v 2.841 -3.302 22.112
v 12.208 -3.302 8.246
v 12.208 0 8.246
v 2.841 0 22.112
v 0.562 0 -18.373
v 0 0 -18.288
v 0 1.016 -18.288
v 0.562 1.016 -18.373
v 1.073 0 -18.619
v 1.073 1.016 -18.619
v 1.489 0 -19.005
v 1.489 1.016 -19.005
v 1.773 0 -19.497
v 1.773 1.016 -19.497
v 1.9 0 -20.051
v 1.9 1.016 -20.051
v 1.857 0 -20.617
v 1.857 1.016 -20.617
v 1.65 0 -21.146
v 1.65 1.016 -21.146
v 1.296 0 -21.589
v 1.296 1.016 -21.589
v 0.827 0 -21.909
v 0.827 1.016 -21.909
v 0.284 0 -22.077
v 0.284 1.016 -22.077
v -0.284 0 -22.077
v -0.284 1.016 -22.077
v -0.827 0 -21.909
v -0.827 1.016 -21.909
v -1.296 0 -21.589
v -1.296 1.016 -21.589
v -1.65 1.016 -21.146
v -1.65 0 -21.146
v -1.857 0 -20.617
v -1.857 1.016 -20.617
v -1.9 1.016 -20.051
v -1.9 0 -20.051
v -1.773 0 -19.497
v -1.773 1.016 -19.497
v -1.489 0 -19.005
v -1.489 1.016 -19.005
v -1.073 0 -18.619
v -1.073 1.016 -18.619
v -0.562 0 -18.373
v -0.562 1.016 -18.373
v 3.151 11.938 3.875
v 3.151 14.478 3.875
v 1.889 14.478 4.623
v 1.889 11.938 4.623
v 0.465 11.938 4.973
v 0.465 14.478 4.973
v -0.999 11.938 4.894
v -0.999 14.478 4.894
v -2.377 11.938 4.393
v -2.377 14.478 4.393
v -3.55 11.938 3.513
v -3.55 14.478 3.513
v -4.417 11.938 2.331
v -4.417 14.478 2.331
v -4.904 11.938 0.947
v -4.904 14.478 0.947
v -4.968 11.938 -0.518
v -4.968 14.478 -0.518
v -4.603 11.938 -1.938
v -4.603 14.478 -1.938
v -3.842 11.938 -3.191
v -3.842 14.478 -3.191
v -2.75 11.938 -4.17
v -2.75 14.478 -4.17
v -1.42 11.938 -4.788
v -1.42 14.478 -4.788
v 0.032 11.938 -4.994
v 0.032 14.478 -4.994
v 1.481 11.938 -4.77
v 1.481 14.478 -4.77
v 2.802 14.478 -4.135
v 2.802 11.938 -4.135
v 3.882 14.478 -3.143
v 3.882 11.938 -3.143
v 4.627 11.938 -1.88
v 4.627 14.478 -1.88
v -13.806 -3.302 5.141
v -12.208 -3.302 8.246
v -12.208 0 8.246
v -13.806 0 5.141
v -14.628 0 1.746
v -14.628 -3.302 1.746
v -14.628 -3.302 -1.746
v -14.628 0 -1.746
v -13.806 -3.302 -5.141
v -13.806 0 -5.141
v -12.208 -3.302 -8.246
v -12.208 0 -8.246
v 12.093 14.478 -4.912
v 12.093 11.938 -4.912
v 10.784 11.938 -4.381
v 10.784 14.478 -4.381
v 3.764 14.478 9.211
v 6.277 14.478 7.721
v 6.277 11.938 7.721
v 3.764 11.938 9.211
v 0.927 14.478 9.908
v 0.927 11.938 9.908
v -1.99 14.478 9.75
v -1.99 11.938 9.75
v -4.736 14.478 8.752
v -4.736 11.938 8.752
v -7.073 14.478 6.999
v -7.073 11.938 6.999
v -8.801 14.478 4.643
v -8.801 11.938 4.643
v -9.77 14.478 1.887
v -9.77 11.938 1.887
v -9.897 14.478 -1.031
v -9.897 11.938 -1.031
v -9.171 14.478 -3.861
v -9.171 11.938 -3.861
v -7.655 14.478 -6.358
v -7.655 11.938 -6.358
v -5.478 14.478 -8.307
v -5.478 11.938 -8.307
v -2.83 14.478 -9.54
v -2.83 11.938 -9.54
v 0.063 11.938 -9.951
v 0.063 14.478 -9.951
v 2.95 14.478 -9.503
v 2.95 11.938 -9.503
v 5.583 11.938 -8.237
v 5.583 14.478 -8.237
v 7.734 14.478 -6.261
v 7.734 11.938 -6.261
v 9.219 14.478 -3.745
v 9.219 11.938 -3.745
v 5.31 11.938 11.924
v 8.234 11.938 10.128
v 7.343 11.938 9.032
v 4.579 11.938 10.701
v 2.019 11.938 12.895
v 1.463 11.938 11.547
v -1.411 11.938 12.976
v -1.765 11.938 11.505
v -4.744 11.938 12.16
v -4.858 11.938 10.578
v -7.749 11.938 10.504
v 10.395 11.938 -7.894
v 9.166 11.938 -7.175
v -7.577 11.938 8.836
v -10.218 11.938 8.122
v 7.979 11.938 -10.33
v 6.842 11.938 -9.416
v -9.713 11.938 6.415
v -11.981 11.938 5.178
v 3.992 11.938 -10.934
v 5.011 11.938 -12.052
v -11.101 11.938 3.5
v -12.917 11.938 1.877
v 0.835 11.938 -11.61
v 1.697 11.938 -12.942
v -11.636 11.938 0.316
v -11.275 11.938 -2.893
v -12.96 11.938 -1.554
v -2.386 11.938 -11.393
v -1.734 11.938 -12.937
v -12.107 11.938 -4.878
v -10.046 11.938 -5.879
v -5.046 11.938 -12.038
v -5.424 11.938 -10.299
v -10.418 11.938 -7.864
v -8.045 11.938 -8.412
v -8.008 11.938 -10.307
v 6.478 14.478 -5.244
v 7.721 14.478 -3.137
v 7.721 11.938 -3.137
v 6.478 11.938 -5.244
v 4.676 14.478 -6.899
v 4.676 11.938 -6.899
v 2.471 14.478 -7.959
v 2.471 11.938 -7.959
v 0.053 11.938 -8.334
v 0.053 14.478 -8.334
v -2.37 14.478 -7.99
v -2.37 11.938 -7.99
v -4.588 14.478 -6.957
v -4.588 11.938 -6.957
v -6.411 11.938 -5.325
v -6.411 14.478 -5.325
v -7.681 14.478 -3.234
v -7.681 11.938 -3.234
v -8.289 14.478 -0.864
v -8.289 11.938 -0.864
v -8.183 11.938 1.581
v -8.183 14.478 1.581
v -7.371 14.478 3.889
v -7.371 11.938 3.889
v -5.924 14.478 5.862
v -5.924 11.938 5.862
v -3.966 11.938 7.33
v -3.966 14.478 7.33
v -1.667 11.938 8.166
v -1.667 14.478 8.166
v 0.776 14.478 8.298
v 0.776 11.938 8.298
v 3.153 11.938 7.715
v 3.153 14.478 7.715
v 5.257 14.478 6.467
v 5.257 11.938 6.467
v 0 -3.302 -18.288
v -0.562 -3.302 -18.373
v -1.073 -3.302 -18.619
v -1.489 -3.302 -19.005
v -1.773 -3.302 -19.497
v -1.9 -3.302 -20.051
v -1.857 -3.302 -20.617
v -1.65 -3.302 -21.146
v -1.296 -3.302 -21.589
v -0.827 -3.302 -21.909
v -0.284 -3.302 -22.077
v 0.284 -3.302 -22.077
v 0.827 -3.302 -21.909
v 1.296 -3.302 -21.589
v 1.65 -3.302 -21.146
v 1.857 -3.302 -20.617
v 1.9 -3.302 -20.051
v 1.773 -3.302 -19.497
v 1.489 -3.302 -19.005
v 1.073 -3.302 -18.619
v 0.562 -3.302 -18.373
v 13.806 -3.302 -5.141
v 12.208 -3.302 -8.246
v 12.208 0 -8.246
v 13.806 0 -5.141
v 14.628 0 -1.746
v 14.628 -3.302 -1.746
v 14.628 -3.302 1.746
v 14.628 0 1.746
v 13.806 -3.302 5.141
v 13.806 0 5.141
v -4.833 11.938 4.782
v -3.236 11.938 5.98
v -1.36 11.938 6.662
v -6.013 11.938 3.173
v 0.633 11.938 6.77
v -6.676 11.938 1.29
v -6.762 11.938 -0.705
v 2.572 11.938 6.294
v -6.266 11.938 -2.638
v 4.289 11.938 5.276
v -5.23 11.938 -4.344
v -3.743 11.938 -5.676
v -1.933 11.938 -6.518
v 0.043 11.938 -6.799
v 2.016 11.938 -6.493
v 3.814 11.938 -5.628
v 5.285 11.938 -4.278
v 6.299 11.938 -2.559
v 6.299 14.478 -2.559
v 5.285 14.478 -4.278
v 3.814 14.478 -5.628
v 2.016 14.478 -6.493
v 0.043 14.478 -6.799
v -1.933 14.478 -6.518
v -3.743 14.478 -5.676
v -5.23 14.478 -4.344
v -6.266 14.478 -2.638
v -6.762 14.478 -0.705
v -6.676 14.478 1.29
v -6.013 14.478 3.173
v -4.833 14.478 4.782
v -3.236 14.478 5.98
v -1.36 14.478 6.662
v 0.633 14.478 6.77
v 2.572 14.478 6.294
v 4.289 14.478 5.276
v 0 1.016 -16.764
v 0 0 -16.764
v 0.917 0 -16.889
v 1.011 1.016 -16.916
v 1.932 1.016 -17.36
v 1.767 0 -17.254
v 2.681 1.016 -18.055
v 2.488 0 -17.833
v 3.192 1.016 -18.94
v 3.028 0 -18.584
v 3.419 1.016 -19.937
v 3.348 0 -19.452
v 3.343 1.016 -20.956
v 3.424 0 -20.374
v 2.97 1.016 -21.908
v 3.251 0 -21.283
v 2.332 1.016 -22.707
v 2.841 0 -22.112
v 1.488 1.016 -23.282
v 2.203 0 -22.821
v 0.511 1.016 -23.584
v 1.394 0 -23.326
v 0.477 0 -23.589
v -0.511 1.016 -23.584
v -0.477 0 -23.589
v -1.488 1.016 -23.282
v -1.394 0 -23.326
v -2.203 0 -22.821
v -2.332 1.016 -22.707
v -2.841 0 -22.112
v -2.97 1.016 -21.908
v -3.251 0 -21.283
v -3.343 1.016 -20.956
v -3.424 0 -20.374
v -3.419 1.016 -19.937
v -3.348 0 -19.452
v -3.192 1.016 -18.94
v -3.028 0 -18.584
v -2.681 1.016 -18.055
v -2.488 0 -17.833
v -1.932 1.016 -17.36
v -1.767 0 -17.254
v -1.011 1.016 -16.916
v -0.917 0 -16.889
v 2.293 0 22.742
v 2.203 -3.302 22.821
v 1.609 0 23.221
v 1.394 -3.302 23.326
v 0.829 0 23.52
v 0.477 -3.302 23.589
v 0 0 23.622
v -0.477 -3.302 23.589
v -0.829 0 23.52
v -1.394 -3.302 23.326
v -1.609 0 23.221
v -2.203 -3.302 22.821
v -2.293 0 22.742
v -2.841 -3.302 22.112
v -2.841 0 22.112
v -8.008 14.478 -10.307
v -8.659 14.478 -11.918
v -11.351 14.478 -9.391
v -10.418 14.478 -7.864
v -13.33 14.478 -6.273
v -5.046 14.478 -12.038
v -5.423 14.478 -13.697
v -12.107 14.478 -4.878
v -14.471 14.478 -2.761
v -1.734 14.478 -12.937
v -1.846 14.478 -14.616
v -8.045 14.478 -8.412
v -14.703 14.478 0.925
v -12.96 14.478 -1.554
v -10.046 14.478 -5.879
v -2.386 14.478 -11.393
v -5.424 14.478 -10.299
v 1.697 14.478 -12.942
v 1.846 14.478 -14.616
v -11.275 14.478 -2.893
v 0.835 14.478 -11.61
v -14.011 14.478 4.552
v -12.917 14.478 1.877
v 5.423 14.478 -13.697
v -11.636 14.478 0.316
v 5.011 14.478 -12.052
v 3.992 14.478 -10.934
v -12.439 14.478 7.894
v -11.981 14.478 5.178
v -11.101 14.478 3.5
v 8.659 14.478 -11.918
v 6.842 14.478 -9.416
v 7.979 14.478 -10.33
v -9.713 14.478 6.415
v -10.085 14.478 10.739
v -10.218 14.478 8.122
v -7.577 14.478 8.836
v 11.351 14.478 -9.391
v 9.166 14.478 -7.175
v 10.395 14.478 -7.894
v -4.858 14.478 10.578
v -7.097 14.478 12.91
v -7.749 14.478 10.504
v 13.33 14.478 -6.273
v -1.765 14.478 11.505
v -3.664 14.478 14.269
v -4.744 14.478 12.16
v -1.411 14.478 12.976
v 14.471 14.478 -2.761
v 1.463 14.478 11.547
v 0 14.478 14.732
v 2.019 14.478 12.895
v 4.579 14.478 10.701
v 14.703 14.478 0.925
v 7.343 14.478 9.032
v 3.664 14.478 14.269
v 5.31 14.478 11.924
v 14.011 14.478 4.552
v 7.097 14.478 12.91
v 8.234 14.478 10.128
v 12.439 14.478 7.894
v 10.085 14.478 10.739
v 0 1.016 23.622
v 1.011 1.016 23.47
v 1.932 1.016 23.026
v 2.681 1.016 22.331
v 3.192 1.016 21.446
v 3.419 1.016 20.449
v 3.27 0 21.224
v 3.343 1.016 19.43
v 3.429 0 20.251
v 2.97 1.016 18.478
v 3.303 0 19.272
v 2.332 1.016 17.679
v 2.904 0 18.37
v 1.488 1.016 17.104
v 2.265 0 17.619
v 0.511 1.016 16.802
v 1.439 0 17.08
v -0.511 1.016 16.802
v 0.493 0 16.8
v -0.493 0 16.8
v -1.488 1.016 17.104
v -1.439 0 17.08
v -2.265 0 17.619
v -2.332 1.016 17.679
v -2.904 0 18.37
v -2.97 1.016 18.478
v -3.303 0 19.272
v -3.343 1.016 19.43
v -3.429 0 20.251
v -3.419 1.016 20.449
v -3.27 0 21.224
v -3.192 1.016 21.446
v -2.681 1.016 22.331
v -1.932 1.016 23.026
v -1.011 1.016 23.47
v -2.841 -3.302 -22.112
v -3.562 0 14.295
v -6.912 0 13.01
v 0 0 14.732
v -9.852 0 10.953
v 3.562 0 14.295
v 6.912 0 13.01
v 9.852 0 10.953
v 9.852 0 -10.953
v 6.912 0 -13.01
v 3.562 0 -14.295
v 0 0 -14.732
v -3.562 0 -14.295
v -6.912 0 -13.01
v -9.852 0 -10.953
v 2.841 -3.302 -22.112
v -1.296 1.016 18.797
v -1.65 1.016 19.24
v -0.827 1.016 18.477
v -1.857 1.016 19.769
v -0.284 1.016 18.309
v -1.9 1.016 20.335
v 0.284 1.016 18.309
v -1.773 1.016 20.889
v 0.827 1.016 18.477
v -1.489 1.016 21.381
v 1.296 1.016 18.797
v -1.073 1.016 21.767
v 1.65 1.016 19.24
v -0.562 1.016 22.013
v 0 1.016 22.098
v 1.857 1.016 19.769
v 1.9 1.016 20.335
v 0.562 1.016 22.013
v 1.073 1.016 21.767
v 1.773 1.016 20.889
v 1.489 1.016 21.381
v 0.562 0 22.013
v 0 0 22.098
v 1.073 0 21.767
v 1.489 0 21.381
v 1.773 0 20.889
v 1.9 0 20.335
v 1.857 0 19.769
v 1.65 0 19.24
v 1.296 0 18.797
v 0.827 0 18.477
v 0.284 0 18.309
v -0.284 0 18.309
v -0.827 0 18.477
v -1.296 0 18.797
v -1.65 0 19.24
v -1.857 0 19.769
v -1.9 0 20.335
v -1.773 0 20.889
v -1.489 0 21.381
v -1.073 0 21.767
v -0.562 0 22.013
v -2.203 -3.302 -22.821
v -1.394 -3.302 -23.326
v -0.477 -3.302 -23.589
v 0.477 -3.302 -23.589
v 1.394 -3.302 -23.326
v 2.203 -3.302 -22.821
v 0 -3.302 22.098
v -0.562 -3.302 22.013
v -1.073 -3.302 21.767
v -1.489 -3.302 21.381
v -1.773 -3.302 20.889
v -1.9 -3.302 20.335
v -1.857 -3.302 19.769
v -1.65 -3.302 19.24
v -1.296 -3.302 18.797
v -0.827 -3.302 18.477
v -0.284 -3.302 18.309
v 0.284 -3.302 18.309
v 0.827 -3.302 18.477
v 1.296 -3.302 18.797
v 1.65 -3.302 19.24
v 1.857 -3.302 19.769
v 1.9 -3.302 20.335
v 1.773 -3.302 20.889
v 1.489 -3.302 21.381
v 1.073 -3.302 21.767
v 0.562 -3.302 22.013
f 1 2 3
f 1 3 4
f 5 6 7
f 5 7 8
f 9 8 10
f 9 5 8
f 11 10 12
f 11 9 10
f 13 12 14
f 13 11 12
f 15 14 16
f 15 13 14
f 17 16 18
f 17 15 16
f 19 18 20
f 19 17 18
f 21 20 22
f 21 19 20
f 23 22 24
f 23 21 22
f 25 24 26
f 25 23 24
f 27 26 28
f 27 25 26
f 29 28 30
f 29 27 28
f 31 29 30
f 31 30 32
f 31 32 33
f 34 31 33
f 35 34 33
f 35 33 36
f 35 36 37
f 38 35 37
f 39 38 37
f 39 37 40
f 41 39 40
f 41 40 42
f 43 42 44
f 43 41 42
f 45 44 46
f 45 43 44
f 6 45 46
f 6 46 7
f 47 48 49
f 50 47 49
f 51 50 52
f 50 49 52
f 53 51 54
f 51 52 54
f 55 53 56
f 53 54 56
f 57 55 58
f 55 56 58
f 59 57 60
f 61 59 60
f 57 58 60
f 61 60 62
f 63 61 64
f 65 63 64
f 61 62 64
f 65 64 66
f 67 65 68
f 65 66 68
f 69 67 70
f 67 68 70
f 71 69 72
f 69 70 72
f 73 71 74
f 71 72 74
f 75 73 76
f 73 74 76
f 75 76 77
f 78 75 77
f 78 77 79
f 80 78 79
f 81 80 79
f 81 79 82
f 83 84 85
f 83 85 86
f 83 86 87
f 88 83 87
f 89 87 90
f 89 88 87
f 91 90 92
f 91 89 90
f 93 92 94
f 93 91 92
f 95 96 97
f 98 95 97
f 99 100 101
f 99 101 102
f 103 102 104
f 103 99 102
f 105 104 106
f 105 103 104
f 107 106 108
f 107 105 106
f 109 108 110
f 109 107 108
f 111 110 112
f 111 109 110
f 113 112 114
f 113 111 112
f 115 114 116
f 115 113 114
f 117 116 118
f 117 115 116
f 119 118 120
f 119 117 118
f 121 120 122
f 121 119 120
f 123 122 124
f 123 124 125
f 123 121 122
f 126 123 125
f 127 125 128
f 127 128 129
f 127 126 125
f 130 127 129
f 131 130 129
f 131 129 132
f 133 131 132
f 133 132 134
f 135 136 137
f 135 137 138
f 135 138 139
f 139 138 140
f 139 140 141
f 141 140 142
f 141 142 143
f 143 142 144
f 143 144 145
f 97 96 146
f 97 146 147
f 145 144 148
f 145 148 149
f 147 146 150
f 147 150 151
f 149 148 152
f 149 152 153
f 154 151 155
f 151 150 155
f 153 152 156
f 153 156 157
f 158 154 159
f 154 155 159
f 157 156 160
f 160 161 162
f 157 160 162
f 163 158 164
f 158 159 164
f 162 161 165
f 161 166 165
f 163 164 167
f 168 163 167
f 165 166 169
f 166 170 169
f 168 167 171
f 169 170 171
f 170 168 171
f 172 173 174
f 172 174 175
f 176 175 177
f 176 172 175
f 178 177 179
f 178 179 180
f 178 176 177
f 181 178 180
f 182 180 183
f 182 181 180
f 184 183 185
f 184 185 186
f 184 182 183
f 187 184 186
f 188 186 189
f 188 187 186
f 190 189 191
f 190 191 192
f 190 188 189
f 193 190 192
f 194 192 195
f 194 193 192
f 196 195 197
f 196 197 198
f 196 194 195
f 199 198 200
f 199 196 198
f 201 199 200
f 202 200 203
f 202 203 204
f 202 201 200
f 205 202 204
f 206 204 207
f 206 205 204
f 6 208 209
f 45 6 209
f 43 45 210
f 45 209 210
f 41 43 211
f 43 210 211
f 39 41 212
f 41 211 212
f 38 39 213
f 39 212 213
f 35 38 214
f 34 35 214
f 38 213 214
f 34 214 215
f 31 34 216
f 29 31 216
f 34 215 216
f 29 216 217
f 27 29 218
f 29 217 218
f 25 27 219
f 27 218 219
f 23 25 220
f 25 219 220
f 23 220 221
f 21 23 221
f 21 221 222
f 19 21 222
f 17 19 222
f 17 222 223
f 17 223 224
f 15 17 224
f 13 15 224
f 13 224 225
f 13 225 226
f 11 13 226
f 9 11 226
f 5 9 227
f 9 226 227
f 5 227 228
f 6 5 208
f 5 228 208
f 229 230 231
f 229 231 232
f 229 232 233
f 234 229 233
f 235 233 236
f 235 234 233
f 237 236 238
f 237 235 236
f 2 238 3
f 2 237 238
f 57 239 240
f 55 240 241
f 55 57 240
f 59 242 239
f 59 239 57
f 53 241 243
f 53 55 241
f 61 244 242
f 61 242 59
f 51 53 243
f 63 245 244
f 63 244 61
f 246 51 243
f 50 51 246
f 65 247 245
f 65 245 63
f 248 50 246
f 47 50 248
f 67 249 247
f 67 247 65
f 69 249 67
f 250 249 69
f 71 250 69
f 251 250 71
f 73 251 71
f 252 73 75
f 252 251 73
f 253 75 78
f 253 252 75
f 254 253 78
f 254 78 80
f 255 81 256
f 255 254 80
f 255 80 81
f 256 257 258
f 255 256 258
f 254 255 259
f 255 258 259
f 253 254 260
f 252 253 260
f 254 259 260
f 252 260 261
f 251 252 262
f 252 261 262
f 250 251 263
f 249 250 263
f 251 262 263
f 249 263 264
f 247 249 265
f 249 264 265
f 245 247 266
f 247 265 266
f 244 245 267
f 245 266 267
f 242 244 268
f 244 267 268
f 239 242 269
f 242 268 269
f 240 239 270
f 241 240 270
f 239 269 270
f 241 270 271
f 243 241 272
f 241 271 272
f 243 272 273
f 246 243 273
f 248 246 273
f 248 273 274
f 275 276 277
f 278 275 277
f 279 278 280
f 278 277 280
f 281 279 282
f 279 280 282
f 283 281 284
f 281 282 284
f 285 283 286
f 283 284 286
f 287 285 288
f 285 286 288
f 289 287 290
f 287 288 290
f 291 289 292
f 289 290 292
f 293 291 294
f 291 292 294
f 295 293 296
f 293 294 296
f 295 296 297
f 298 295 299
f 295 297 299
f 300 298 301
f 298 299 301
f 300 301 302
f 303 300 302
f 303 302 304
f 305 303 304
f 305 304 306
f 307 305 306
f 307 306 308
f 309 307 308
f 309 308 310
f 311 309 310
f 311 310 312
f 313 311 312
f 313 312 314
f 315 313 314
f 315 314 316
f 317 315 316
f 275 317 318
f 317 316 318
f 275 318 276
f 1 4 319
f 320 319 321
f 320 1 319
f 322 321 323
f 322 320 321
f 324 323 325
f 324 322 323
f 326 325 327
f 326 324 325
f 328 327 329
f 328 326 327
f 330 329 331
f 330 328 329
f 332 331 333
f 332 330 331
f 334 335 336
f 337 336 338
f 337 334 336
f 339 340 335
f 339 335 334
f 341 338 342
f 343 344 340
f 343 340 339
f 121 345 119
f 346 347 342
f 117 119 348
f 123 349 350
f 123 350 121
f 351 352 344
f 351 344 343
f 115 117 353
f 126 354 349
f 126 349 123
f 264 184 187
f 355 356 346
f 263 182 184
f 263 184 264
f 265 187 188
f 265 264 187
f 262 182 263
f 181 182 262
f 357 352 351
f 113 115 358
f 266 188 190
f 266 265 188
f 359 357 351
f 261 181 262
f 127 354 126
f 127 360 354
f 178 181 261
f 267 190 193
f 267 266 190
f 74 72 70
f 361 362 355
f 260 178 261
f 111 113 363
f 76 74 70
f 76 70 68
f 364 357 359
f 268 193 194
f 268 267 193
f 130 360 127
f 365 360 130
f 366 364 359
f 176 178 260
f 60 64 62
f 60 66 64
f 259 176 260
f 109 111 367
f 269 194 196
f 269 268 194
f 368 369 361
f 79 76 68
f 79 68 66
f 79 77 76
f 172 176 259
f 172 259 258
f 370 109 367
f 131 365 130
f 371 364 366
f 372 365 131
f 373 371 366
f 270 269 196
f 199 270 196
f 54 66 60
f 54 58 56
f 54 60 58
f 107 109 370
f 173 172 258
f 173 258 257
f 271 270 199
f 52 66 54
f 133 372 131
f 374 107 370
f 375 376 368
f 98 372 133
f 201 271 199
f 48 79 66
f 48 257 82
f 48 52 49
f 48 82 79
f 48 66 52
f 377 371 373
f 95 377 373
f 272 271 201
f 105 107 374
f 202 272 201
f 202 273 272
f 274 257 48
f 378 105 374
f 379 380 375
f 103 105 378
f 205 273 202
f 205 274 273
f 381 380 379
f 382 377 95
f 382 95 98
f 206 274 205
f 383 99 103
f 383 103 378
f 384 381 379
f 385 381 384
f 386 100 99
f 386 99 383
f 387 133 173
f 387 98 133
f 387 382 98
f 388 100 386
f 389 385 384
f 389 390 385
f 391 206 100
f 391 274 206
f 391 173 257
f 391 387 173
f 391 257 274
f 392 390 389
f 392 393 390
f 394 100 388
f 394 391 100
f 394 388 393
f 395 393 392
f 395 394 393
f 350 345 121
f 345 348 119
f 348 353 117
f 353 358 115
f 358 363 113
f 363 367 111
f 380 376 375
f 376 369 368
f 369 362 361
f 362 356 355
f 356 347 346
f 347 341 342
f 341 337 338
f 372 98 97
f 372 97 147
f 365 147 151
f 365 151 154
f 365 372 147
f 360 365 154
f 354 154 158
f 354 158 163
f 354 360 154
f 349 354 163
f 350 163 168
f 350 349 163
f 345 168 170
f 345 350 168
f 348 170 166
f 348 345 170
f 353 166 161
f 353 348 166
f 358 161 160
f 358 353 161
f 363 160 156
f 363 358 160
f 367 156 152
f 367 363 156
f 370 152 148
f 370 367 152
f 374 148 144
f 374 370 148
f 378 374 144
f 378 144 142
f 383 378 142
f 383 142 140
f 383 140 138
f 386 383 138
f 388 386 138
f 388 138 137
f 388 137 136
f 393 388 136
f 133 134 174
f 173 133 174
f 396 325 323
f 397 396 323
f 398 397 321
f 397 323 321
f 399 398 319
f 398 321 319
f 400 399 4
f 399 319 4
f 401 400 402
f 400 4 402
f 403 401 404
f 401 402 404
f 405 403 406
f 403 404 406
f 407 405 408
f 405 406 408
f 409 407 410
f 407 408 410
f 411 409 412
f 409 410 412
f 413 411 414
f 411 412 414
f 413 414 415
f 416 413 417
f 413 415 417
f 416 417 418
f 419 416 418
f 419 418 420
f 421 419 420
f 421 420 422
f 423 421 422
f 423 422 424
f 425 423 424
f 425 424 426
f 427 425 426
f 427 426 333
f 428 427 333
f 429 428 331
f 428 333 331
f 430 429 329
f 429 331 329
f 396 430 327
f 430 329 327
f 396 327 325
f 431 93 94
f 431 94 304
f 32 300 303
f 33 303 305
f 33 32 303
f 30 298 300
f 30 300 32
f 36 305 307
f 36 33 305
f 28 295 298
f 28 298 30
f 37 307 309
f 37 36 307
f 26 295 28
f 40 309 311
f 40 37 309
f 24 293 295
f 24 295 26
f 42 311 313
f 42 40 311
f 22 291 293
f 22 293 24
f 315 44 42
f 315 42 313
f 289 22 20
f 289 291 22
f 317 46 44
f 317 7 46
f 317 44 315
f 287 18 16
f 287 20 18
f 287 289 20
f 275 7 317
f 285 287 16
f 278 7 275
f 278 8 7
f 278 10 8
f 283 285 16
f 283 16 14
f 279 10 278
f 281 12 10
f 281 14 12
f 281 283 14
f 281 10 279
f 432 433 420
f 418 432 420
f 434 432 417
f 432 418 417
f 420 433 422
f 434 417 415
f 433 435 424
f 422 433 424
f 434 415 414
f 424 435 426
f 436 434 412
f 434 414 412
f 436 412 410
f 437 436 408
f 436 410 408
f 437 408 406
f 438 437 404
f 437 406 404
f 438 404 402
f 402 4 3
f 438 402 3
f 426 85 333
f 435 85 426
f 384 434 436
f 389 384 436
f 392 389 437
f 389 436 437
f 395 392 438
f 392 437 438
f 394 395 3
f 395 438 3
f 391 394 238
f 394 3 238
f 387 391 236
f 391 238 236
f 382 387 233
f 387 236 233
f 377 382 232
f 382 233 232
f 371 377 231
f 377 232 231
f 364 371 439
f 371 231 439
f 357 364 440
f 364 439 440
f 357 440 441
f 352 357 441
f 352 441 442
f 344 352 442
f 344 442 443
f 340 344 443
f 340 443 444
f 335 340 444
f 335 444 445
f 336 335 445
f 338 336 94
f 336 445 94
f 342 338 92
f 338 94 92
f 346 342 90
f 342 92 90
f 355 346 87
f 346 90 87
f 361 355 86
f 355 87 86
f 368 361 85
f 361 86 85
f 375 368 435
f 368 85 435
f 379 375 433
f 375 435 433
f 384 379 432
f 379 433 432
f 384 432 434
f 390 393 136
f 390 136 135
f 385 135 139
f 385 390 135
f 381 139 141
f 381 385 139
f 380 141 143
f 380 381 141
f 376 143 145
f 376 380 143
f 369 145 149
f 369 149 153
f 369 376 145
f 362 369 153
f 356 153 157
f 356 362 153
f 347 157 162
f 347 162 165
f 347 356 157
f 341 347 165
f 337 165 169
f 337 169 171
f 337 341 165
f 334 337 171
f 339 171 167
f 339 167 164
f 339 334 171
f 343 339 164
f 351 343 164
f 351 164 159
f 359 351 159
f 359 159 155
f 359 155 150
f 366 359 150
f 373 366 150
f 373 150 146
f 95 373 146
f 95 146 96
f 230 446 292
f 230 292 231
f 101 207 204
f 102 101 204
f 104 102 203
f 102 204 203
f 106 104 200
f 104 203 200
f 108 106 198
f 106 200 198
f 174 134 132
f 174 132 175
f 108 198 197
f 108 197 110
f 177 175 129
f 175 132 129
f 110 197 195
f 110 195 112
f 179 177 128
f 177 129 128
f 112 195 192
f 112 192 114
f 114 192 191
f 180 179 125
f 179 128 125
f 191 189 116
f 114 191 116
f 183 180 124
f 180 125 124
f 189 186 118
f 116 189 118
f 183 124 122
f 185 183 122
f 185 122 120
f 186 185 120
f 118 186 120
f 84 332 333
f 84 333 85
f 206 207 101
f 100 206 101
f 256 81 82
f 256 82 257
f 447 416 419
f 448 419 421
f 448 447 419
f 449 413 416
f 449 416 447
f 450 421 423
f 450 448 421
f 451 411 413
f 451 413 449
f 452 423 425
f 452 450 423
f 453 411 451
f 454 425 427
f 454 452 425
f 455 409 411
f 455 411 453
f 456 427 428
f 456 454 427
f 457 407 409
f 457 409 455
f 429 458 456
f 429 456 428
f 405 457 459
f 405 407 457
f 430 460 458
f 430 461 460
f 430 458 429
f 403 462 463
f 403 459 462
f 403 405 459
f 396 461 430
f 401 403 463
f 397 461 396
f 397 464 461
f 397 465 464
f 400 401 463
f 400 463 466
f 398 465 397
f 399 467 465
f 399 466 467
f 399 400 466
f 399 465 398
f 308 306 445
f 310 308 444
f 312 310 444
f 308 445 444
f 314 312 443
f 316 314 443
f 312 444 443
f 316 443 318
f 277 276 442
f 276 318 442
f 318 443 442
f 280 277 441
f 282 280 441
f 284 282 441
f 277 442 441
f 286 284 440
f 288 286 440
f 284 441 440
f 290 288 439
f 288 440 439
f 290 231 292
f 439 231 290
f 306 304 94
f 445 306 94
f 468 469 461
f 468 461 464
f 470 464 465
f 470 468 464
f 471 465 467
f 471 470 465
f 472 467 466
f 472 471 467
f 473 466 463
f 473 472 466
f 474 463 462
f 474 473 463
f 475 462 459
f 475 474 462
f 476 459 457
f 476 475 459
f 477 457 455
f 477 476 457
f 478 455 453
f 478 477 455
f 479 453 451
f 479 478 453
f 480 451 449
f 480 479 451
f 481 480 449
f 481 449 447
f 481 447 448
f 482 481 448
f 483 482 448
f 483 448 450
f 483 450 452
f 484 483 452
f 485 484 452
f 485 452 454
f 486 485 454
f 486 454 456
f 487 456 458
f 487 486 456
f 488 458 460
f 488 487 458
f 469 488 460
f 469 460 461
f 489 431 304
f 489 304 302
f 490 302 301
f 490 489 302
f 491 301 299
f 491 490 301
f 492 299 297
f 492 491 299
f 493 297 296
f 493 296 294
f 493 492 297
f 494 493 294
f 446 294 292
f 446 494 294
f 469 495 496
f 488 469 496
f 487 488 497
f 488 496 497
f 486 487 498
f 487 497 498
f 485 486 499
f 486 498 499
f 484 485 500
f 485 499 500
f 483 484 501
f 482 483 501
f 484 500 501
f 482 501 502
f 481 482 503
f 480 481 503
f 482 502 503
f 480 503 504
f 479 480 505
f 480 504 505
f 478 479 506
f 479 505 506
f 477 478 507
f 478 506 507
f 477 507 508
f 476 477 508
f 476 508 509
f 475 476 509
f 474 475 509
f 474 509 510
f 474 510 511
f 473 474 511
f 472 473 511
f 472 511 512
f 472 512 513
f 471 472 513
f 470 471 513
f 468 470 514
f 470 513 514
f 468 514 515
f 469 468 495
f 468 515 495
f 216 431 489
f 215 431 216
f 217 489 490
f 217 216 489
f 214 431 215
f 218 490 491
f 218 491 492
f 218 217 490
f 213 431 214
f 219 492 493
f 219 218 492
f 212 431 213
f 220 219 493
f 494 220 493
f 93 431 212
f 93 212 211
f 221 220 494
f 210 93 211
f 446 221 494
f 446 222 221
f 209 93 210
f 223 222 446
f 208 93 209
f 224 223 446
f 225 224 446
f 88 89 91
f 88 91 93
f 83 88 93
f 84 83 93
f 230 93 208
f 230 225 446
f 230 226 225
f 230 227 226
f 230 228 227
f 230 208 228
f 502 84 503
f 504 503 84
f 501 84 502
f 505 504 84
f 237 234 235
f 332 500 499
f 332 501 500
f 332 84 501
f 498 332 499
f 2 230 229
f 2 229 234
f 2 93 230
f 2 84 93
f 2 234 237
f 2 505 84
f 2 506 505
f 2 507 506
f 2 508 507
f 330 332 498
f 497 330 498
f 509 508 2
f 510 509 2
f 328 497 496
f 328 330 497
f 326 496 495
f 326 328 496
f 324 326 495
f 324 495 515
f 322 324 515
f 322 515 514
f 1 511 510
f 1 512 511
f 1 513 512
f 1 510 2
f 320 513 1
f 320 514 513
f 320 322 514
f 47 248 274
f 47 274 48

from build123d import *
from build123d.topology import SkipClean

# Parameters (mm, degrees)
SKETCH1_R           = 14.732
BOSS_EXTRUDE1_DEPTH = 14.478
BOSS_EXTRUDE2_START = 3.302
SKETCH2_R           = 1.905
BOSS_EXTRUDE2_DEPTH = 3.302
SKETCH3_R           = 3.429
SKETCH3_R_2         = 1.905
BOSS_EXTRUDE3_DEPTH = 1.016
CUT_EXTRUDE1_DEPTH  = 2.54


with BuildPart() as part:
    # Sketch1 → Boss-Extrude1 (new body)
    with BuildSketch(Plane(origin=(0, 0, 0), x_dir=(1, 0, 0), z_dir=(0, 1, 0))):
        with Locations(Location((0, 0, 0), (0, 0, 270))):
            Circle(SKETCH1_R)
    extrude(amount=BOSS_EXTRUDE1_DEPTH)

    # Sketch2 → Boss-Extrude2 (add)
    with SkipClean():  # the faces are left unmerged after this step: merging them gives an invalid solid
        with BuildSketch(Plane.XZ.offset(BOSS_EXTRUDE2_START)):
            with BuildLine():
                Line((12.207857362, 8.246213836), (2.841484041, 22.112377358))
                ThreePointArc((2.841484041, 22.112377358), (0, 23.622), (-2.841484041, 22.112377358))
                Line((-2.841484041, 22.112377358), (-12.207857362, 8.246213836))
                ThreePointArc((-12.207857362, 8.246213836), (-14.732, 0), (-12.207857362, -8.246213836))
                Line((-12.207857362, -8.246213836), (-2.841484041, -22.112377358))
                ThreePointArc((-2.841484041, -22.112377358), (0, -23.622), (2.841484041, -22.112377358))
                Line((2.841484041, -22.112377358), (12.207857362, -8.246213836))
                ThreePointArc((12.207857362, -8.246213836), (14.732, 0), (12.207857362, 8.246213836))
            make_face()
            with Locations(Location((0, -20.193, 0), (0, 0, 90))):
                Circle(SKETCH2_R, mode=Mode.SUBTRACT)
            with Locations(Location((0, 20.193, 0), (0, 0, 90))):
                Circle(SKETCH2_R, mode=Mode.SUBTRACT)
        extrude(amount=-BOSS_EXTRUDE2_DEPTH)

    # Sketch3 → Boss-Extrude3 (add)
    # profile 1 of 2: a face of its own
    with SkipClean():  # the faces are left unmerged after this step: merging them gives an invalid solid
        with BuildSketch(Plane(origin=(0, 0, 0), x_dir=(1, 0, 0), z_dir=(0, 1, 0))):
            with Locations(Location((0, 20.193, 0), (0, 0, 270))):
                Circle(SKETCH3_R)
            with Locations(Location((0, 20.193, 0), (0, 0, 270))):
                Circle(SKETCH3_R_2, mode=Mode.SUBTRACT)
        # profile 2 of 2: a face of its own
        with BuildSketch(Plane(origin=(0, 0, 0), x_dir=(1, 0, 0), z_dir=(0, 1, 0))):
            with Locations(Location((0, -20.193, 0), (0, 0, 270))):
                Circle(SKETCH3_R)
            with Locations(Location((0, -20.193, 0), (0, 0, 270))):
                Circle(SKETCH3_R_2, mode=Mode.SUBTRACT)
        extrude(amount=BOSS_EXTRUDE3_DEPTH)

    # Sketch4 → Cut-Extrude1 (cut)
    with SkipClean():  # the faces are left unmerged after this step: merging them gives an invalid solid
        with BuildSketch(Plane(origin=(0, 14.478, 0), x_dir=(1, 0, 0), z_dir=(0, 1, 0))):
            with BuildLine():
                Line((4.627366212, 1.879749362), (6.299197436, 2.558888105))
                ThreePointArc((6.299197436, 2.558888105), (-6.58577895, 1.689766936), (4.289039466, -5.275598272))
                Line((4.289039466, -5.275598272), (3.150711898, -3.875434203))
                ThreePointArc((3.150711898, -3.875434203), (-4.83788789, 1.241296293), (4.627366212, 1.879749362))
            make_face()
            with BuildLine():
                Line((5.257301605, -6.466578702), (6.277197533, -7.721069653))
                ThreePointArc((6.277197533, -7.721069653), (-9.638576586, 2.473048086), (9.219151961, 3.745045069))
                Line((9.219151961, 3.745045069), (7.721258116, 3.136563944))
                ThreePointArc((7.721258116, 3.136563944), (-8.072536174, 2.071236345), (5.257301605, -6.466578702))
            make_face()
            with BuildLine():
                Line((7.342672007, -9.031623062), (8.233849794, -10.127788306))
                ThreePointArc((8.233849794, -10.127788306), (-12.64299736, 3.243916791), (12.092834753, 4.912405322))
                Line((12.092834753, 4.912405322), (10.783985796, 4.380718855))
                ThreePointArc((10.783985796, 4.380718855), (-11.274602419, 2.892816557), (7.342672007, -9.031623062))
            make_face()
        extrude(amount=-CUT_EXTRUDE1_DEPTH, mode=Mode.SUBTRACT)


solid = part.part
